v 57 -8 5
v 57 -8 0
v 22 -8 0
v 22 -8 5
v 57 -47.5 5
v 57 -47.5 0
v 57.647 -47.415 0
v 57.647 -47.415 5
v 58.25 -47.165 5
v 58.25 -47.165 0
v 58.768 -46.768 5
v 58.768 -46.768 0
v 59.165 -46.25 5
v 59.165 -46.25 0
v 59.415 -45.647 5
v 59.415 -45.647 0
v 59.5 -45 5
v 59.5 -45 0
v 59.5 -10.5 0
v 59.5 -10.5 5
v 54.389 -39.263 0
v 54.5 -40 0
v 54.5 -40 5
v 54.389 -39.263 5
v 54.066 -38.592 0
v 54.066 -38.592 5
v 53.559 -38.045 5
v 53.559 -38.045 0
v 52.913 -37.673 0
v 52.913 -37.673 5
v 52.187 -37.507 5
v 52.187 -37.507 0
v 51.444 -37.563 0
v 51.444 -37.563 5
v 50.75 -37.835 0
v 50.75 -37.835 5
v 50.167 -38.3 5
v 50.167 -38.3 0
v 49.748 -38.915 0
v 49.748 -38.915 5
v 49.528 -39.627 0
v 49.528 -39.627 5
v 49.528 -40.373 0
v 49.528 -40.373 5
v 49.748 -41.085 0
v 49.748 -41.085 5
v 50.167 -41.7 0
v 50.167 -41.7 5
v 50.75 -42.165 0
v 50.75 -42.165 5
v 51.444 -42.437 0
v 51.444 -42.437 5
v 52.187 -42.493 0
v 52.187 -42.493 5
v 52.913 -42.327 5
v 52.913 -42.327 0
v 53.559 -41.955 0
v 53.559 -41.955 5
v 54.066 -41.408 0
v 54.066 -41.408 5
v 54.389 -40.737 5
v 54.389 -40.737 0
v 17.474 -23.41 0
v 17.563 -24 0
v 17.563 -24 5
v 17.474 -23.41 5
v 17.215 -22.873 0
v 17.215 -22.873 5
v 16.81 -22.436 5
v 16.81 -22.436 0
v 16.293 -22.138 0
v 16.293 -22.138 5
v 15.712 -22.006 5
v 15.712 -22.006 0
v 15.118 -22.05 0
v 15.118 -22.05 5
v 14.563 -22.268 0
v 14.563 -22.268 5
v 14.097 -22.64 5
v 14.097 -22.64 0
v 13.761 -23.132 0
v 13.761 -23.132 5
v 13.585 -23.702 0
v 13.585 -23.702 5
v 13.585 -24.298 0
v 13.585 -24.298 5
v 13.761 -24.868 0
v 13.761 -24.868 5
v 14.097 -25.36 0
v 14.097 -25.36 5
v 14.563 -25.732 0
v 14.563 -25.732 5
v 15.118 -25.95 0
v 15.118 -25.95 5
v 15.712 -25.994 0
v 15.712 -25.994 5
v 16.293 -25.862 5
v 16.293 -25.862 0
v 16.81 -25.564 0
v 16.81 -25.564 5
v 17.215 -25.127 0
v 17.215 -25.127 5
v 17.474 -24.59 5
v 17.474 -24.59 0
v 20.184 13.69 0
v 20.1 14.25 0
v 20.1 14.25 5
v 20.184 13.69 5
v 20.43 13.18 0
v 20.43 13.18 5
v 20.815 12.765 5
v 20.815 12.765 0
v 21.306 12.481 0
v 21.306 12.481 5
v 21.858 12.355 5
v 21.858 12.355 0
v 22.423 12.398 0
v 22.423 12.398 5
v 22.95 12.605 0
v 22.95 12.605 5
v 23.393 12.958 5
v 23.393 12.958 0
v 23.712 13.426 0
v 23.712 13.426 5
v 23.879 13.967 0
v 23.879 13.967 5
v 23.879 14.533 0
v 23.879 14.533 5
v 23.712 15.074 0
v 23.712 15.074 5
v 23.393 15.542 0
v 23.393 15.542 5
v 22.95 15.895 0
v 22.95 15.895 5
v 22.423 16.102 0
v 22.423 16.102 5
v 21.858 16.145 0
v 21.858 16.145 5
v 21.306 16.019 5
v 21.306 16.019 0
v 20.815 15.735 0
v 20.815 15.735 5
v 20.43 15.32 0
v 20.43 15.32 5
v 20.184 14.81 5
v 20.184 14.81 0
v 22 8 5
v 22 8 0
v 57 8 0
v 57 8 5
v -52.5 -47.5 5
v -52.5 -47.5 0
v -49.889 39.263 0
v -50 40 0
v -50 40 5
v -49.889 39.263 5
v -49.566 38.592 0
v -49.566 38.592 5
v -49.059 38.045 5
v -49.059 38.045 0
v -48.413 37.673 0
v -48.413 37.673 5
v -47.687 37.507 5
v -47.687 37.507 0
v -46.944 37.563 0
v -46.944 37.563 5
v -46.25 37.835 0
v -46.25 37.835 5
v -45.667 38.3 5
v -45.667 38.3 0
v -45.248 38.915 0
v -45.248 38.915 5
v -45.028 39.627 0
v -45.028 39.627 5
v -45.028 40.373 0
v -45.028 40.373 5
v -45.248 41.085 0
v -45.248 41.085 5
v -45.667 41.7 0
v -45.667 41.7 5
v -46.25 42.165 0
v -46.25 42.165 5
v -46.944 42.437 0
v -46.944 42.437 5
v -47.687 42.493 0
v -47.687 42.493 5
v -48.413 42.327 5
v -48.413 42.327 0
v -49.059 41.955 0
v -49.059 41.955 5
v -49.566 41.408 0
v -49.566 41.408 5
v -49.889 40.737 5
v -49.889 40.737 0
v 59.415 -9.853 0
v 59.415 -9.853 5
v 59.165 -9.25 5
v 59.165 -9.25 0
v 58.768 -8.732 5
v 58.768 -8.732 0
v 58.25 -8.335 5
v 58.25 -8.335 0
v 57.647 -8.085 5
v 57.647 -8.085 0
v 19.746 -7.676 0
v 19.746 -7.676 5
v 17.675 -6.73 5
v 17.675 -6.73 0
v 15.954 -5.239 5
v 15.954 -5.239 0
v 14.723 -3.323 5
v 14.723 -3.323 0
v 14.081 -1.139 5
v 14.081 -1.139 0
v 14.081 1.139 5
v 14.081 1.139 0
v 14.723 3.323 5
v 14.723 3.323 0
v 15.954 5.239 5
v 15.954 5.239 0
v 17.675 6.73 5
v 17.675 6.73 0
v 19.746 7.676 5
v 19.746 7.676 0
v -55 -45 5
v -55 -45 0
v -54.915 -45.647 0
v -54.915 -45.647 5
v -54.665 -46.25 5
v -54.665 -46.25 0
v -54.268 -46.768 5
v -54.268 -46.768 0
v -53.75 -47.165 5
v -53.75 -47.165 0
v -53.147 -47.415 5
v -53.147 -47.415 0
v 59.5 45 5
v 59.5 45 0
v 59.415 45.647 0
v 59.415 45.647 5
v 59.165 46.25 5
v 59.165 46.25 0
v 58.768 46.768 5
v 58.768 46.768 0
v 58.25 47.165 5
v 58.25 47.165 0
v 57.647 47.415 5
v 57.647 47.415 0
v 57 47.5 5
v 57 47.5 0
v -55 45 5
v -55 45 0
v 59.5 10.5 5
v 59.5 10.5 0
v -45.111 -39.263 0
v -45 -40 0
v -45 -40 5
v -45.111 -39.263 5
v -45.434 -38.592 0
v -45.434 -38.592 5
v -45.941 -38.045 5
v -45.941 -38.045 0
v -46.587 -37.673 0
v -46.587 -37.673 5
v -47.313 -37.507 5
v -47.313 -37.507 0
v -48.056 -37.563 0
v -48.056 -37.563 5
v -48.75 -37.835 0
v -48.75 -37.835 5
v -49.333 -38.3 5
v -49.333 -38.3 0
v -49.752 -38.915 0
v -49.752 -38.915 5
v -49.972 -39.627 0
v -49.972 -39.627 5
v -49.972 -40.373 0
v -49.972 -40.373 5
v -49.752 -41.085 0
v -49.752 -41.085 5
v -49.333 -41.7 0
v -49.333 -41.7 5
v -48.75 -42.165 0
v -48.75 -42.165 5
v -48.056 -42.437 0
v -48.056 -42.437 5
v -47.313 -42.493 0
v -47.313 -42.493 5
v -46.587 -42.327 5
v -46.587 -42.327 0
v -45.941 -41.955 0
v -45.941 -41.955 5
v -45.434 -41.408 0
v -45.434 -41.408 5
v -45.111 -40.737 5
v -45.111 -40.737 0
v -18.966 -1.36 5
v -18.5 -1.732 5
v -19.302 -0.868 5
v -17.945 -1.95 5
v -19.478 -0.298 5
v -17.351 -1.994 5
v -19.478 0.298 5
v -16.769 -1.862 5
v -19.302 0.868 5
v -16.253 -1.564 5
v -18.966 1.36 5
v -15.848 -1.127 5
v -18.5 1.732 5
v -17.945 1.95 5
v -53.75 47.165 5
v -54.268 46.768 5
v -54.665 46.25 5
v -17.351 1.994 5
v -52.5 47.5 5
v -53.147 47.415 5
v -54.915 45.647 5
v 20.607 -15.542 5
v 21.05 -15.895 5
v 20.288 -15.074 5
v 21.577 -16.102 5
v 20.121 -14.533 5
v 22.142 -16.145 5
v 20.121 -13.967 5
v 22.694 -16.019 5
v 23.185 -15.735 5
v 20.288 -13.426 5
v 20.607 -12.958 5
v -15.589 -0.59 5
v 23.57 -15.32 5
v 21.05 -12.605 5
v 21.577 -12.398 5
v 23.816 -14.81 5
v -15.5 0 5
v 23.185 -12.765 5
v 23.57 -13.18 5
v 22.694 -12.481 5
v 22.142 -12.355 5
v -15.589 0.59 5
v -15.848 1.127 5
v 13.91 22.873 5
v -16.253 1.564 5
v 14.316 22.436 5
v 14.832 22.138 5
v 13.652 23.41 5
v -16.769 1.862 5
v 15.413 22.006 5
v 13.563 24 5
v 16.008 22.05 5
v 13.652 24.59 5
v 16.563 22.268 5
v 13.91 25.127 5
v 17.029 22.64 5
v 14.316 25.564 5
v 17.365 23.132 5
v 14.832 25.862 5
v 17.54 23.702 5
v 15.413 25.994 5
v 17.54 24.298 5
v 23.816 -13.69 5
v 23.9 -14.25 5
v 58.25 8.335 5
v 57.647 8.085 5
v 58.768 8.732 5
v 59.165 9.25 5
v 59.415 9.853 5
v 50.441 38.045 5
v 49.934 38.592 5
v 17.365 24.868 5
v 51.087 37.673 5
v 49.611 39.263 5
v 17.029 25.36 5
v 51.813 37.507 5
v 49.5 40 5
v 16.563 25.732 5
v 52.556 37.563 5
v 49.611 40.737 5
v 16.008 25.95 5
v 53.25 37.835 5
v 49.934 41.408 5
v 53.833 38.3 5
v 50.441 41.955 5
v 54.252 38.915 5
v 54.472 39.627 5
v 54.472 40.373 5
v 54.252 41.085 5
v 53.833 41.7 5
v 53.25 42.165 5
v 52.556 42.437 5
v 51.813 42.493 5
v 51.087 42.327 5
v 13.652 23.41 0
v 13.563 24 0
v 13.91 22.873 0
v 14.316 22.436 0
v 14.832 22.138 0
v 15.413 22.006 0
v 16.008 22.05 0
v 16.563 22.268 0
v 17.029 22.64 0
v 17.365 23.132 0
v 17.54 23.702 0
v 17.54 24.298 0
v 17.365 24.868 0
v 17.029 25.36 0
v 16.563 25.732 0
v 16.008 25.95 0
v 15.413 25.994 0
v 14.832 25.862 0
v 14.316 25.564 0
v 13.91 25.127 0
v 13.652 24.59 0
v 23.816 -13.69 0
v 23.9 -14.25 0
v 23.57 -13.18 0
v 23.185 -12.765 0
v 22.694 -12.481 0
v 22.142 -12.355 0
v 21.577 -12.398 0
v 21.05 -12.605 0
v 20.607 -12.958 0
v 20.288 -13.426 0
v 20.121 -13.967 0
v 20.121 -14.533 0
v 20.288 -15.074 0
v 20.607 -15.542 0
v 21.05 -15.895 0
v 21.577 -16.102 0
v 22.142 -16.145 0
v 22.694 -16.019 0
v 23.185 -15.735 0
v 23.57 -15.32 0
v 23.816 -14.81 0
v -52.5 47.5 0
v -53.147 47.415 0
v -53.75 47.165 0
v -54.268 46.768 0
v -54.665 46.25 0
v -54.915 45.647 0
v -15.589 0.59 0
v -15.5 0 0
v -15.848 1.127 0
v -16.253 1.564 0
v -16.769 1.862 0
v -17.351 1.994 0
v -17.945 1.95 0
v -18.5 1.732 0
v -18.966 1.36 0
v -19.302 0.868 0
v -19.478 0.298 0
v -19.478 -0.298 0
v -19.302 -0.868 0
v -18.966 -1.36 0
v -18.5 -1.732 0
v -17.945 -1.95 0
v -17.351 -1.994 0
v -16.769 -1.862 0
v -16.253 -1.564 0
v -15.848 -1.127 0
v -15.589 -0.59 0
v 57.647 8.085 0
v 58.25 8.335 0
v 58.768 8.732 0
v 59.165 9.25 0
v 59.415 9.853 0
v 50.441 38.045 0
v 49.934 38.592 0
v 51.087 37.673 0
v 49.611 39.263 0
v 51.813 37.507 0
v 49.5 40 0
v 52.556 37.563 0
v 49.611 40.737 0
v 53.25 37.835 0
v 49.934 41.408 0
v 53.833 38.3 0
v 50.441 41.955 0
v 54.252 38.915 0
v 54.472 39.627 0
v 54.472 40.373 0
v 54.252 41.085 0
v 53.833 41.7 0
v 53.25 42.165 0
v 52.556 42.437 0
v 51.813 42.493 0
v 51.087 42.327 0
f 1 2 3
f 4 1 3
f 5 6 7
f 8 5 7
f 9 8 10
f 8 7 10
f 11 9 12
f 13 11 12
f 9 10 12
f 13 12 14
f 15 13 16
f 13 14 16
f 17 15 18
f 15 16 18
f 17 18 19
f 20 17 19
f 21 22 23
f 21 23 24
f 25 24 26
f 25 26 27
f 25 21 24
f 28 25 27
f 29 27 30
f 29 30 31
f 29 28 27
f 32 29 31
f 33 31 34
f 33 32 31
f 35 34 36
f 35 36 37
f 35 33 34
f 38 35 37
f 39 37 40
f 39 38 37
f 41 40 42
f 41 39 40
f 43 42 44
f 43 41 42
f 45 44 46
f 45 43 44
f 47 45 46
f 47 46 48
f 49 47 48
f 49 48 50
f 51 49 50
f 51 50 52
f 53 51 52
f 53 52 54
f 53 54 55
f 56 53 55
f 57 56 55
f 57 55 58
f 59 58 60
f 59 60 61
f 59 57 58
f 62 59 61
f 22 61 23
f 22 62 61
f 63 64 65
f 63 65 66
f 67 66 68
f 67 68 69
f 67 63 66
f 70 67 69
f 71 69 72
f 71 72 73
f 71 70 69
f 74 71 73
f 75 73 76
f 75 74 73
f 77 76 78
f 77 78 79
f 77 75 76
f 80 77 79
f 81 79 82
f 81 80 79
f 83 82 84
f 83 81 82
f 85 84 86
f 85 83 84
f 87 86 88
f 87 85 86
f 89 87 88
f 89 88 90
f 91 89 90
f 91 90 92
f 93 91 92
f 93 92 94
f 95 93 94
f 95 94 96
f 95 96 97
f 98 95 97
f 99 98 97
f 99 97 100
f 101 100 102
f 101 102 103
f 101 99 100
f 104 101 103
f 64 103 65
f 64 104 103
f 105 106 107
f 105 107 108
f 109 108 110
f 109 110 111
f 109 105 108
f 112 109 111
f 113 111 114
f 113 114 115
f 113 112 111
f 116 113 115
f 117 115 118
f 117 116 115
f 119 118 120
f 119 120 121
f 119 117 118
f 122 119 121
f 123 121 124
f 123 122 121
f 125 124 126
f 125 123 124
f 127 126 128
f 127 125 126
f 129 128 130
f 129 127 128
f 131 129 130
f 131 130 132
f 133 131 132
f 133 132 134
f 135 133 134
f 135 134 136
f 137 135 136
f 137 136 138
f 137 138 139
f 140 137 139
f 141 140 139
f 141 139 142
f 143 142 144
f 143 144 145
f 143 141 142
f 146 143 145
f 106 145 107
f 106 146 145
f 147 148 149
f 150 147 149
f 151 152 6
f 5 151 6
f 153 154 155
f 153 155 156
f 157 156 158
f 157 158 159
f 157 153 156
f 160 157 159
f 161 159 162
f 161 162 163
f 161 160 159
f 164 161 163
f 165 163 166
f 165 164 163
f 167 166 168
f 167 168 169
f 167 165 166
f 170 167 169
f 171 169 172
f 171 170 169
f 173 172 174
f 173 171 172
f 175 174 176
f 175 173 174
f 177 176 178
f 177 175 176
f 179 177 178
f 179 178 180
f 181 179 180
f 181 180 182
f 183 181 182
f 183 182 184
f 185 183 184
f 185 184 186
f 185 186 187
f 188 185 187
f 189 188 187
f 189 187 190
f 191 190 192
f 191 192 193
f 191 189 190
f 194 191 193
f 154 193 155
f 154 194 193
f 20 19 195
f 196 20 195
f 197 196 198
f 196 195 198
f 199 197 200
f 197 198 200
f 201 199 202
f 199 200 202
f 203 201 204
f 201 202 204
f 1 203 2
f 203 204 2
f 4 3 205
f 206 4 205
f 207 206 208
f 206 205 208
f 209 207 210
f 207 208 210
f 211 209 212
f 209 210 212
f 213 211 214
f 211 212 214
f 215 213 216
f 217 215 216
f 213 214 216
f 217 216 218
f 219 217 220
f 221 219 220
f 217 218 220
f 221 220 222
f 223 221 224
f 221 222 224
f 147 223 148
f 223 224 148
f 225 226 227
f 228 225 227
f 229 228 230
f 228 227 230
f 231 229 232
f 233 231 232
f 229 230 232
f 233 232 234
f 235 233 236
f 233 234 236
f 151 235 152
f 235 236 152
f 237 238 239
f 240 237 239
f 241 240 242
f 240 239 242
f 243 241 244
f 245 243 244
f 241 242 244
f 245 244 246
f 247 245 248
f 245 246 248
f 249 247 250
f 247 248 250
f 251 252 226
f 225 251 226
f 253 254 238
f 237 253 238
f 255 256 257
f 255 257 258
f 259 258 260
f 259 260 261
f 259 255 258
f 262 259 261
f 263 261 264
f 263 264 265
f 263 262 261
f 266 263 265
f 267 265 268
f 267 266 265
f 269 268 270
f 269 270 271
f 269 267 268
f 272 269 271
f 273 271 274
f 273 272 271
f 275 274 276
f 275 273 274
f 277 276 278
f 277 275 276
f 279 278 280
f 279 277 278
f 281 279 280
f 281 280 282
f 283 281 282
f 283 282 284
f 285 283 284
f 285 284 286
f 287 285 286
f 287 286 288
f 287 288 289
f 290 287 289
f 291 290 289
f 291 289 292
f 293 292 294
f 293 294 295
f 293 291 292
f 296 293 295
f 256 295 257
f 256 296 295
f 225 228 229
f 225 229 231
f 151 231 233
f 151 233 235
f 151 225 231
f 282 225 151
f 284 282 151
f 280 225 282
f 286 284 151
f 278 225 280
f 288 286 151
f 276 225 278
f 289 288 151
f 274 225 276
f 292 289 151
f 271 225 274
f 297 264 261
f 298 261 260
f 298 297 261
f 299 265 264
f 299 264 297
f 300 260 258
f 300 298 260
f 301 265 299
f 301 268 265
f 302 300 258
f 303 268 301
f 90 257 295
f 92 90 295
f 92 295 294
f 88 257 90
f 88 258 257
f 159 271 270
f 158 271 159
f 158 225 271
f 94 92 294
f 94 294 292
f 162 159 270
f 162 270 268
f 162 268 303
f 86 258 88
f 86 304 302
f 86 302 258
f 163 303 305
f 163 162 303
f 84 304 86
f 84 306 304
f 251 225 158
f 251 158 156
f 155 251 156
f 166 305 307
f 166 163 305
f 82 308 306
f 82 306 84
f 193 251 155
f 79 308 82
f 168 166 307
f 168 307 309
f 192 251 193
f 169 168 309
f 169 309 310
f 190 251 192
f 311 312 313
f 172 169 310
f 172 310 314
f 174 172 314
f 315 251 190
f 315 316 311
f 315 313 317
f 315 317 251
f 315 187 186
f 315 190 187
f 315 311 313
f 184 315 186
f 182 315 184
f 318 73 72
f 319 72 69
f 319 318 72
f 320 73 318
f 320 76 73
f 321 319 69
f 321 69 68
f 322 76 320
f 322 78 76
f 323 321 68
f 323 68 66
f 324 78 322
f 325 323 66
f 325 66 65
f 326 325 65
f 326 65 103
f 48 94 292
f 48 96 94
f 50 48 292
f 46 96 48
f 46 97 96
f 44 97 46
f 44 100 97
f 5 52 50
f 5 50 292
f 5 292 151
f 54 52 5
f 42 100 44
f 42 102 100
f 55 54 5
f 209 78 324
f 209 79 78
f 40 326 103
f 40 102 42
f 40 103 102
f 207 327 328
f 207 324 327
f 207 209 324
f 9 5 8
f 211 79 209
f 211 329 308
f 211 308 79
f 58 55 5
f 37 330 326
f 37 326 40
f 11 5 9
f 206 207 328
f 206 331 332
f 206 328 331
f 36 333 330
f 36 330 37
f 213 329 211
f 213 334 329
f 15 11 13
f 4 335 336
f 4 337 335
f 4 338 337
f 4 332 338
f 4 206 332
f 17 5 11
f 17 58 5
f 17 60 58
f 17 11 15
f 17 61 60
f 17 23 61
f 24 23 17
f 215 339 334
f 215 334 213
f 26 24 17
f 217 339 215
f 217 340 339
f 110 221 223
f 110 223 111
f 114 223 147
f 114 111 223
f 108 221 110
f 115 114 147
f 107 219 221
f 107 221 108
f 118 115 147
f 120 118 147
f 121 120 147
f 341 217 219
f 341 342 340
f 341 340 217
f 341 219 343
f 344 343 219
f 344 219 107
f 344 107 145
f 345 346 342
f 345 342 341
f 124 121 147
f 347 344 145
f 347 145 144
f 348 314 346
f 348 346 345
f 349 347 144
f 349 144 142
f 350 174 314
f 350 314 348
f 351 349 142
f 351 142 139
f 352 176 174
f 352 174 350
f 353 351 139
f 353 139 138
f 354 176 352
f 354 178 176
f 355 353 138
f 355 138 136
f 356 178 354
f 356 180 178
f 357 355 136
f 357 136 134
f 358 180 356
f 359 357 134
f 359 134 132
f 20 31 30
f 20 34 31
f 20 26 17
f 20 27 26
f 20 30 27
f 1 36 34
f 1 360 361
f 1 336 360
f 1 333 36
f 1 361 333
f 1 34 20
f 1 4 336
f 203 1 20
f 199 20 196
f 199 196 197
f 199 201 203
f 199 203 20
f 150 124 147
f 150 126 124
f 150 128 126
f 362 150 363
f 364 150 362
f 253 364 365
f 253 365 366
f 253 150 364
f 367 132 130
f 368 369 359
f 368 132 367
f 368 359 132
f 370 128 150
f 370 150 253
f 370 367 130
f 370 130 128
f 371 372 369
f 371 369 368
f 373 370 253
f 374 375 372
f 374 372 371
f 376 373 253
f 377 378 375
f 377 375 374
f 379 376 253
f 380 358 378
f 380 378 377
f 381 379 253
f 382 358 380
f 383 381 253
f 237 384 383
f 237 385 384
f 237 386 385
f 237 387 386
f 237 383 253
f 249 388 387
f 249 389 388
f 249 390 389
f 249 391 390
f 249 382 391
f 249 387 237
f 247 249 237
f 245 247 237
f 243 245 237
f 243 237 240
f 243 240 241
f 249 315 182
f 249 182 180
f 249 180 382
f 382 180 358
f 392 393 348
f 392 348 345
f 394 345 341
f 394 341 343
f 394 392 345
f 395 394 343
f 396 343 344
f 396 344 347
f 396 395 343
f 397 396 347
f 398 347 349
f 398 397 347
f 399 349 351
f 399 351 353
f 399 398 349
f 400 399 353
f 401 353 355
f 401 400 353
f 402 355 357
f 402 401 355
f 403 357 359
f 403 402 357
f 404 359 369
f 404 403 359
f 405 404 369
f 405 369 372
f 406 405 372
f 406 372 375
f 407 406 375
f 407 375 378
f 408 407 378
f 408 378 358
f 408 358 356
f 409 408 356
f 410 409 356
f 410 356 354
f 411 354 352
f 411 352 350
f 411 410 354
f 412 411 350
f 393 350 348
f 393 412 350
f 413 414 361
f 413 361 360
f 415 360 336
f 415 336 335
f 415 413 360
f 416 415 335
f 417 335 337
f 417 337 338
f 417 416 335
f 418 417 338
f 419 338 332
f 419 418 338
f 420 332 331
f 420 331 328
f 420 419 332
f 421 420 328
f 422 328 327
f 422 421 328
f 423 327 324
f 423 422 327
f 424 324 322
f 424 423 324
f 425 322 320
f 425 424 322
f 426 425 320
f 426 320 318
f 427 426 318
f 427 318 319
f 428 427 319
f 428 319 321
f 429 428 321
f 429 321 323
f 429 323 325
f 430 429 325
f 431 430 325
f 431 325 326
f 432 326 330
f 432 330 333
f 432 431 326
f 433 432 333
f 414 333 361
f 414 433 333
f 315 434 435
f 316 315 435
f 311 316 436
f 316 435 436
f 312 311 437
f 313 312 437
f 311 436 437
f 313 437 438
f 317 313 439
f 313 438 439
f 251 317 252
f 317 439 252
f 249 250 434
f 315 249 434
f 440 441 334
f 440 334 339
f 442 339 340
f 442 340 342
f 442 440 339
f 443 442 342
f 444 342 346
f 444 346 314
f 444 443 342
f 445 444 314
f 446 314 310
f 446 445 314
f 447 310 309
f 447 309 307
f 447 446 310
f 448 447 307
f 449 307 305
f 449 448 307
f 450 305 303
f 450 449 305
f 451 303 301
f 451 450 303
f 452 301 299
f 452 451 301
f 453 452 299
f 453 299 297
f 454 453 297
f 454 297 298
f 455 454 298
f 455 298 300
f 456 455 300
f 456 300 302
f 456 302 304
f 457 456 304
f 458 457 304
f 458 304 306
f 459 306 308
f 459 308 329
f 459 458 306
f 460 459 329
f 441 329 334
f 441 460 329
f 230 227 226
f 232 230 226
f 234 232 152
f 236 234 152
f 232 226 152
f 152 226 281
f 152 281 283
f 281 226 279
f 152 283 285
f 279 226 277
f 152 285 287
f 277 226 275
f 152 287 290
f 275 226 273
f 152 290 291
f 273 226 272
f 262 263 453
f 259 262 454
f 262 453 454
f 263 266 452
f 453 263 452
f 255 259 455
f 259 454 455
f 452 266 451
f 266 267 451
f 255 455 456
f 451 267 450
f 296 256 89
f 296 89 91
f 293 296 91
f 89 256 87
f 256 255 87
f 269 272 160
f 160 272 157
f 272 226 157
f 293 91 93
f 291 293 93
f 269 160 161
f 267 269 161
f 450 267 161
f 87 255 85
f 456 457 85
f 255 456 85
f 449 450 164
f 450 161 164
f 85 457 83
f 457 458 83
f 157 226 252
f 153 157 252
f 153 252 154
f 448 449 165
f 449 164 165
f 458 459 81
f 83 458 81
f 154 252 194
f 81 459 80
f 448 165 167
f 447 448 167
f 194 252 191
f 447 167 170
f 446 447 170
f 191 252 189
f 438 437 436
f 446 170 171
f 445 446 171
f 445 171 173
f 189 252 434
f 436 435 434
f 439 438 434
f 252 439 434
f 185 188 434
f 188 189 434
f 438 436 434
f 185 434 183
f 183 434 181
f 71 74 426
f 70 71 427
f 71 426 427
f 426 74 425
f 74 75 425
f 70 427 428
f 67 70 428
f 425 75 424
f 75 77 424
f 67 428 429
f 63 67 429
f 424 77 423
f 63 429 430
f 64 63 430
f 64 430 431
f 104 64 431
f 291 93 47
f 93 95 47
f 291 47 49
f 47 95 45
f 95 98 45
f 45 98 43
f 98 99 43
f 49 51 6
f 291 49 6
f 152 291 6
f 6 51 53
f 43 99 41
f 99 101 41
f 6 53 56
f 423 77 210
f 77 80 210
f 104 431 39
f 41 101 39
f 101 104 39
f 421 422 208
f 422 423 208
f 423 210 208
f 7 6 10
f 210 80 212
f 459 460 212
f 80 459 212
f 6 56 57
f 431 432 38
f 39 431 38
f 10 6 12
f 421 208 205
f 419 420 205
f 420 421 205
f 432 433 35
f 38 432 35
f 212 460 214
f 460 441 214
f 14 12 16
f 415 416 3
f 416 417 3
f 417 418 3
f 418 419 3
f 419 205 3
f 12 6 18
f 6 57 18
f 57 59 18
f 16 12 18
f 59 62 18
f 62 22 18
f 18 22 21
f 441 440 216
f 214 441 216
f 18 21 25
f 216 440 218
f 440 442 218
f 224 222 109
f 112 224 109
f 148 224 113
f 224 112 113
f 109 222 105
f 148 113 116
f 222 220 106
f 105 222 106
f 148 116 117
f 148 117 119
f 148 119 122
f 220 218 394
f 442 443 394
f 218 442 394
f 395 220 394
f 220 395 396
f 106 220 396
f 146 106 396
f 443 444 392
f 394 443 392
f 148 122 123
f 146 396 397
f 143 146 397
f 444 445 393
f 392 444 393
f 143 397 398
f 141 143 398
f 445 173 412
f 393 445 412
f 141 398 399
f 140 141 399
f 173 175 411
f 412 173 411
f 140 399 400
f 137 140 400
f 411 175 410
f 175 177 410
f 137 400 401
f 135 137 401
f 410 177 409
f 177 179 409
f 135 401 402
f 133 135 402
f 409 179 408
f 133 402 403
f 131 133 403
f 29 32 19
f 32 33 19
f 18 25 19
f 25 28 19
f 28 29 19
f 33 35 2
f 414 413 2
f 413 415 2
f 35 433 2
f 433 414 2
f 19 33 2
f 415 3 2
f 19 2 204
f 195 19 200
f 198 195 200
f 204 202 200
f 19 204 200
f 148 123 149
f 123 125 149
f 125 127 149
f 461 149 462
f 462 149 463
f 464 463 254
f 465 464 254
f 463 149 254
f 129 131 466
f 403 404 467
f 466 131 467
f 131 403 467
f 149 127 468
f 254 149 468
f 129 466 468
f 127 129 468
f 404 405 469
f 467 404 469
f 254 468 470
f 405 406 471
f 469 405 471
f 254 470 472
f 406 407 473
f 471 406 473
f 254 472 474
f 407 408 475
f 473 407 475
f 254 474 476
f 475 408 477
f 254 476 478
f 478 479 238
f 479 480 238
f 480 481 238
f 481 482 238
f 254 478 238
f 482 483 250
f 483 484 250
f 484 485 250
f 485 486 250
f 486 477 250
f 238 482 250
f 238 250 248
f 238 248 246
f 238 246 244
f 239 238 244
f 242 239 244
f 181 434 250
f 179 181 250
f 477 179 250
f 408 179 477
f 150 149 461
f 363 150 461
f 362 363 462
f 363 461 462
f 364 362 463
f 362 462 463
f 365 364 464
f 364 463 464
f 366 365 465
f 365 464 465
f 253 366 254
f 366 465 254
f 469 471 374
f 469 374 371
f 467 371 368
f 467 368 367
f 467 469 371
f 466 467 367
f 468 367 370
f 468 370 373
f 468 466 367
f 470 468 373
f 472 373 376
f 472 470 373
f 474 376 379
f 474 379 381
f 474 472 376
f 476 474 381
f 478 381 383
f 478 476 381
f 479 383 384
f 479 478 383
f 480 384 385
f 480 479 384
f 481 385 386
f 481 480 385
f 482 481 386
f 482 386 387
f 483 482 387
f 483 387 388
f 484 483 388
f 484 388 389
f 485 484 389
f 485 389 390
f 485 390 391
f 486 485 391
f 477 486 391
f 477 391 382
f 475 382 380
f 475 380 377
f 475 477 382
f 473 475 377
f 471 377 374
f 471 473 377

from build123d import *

# Parameters (mm, degrees)
SKETCH1_R           = 2
SKETCH1_R_2         = 1.9
SKETCH1_R_3         = 2.5
BOSS_EXTRUDE1_DEPTH = 5


with BuildPart() as part:
    # Sketch1 → Boss-Extrude1 (new body)
    with BuildSketch(Plane.XY):
        with BuildLine():
            Line((-55, 45), (-55, -45))
            ThreePointArc((-55, -45), (-54.267766953, -46.767766953), (-52.5, -47.5))
            Line((-52.5, -47.5), (57, -47.5))
            ThreePointArc((57, -47.5), (58.767766953, -46.767766953), (59.5, -45))
            Line((59.5, -45), (59.5, -10.5))
            ThreePointArc((59.5, -10.5), (58.767766953, -8.732233047), (57, -8))
            Line((57, -8), (22, -8))
            ThreePointArc((22, -8), (14, 0), (22, 8))
            Line((22, 8), (57, 8))
            ThreePointArc((57, 8), (58.767766953, 8.732233047), (59.5, 10.5))
            Line((59.5, 10.5), (59.5, 45))
            ThreePointArc((59.5, 45), (58.767766953, 46.767766953), (57, 47.5))
            Line((57, 47.5), (-52.5, 47.5))
            ThreePointArc((-52.5, 47.5), (-54.267766953, 46.767766953), (-55, 45))
        make_face()
        with Locations(Location((15.562803405, 24, 0), (0, 0, 180))):
            Circle(SKETCH1_R, mode=Mode.SUBTRACT)
        with Locations((22, -14.25)):
            Circle(SKETCH1_R_2, mode=Mode.SUBTRACT)
        with Locations(Location((22, 14.25, 0), (0, 0, 180))):
            Circle(SKETCH1_R_2, mode=Mode.SUBTRACT)
        with Locations((52, -40)):
            Circle(SKETCH1_R_3, mode=Mode.SUBTRACT)
        with Locations((-47.5, -40)):
            Circle(SKETCH1_R_3, mode=Mode.SUBTRACT)
        with Locations((15.562803405, -24)):
            Circle(SKETCH1_R, mode=Mode.SUBTRACT)
        with Locations((-17.5, 0)):
            Circle(SKETCH1_R, mode=Mode.SUBTRACT)
        with Locations(Location((-47.5, 40, 0), (0, 0, 180))):
            Circle(SKETCH1_R_3, mode=Mode.SUBTRACT)
        with Locations(Location((52, 40, 0), (0, 0, 180))):
            Circle(SKETCH1_R_3, mode=Mode.SUBTRACT)
    extrude(amount=BOSS_EXTRUDE1_DEPTH)


solid = part.part
